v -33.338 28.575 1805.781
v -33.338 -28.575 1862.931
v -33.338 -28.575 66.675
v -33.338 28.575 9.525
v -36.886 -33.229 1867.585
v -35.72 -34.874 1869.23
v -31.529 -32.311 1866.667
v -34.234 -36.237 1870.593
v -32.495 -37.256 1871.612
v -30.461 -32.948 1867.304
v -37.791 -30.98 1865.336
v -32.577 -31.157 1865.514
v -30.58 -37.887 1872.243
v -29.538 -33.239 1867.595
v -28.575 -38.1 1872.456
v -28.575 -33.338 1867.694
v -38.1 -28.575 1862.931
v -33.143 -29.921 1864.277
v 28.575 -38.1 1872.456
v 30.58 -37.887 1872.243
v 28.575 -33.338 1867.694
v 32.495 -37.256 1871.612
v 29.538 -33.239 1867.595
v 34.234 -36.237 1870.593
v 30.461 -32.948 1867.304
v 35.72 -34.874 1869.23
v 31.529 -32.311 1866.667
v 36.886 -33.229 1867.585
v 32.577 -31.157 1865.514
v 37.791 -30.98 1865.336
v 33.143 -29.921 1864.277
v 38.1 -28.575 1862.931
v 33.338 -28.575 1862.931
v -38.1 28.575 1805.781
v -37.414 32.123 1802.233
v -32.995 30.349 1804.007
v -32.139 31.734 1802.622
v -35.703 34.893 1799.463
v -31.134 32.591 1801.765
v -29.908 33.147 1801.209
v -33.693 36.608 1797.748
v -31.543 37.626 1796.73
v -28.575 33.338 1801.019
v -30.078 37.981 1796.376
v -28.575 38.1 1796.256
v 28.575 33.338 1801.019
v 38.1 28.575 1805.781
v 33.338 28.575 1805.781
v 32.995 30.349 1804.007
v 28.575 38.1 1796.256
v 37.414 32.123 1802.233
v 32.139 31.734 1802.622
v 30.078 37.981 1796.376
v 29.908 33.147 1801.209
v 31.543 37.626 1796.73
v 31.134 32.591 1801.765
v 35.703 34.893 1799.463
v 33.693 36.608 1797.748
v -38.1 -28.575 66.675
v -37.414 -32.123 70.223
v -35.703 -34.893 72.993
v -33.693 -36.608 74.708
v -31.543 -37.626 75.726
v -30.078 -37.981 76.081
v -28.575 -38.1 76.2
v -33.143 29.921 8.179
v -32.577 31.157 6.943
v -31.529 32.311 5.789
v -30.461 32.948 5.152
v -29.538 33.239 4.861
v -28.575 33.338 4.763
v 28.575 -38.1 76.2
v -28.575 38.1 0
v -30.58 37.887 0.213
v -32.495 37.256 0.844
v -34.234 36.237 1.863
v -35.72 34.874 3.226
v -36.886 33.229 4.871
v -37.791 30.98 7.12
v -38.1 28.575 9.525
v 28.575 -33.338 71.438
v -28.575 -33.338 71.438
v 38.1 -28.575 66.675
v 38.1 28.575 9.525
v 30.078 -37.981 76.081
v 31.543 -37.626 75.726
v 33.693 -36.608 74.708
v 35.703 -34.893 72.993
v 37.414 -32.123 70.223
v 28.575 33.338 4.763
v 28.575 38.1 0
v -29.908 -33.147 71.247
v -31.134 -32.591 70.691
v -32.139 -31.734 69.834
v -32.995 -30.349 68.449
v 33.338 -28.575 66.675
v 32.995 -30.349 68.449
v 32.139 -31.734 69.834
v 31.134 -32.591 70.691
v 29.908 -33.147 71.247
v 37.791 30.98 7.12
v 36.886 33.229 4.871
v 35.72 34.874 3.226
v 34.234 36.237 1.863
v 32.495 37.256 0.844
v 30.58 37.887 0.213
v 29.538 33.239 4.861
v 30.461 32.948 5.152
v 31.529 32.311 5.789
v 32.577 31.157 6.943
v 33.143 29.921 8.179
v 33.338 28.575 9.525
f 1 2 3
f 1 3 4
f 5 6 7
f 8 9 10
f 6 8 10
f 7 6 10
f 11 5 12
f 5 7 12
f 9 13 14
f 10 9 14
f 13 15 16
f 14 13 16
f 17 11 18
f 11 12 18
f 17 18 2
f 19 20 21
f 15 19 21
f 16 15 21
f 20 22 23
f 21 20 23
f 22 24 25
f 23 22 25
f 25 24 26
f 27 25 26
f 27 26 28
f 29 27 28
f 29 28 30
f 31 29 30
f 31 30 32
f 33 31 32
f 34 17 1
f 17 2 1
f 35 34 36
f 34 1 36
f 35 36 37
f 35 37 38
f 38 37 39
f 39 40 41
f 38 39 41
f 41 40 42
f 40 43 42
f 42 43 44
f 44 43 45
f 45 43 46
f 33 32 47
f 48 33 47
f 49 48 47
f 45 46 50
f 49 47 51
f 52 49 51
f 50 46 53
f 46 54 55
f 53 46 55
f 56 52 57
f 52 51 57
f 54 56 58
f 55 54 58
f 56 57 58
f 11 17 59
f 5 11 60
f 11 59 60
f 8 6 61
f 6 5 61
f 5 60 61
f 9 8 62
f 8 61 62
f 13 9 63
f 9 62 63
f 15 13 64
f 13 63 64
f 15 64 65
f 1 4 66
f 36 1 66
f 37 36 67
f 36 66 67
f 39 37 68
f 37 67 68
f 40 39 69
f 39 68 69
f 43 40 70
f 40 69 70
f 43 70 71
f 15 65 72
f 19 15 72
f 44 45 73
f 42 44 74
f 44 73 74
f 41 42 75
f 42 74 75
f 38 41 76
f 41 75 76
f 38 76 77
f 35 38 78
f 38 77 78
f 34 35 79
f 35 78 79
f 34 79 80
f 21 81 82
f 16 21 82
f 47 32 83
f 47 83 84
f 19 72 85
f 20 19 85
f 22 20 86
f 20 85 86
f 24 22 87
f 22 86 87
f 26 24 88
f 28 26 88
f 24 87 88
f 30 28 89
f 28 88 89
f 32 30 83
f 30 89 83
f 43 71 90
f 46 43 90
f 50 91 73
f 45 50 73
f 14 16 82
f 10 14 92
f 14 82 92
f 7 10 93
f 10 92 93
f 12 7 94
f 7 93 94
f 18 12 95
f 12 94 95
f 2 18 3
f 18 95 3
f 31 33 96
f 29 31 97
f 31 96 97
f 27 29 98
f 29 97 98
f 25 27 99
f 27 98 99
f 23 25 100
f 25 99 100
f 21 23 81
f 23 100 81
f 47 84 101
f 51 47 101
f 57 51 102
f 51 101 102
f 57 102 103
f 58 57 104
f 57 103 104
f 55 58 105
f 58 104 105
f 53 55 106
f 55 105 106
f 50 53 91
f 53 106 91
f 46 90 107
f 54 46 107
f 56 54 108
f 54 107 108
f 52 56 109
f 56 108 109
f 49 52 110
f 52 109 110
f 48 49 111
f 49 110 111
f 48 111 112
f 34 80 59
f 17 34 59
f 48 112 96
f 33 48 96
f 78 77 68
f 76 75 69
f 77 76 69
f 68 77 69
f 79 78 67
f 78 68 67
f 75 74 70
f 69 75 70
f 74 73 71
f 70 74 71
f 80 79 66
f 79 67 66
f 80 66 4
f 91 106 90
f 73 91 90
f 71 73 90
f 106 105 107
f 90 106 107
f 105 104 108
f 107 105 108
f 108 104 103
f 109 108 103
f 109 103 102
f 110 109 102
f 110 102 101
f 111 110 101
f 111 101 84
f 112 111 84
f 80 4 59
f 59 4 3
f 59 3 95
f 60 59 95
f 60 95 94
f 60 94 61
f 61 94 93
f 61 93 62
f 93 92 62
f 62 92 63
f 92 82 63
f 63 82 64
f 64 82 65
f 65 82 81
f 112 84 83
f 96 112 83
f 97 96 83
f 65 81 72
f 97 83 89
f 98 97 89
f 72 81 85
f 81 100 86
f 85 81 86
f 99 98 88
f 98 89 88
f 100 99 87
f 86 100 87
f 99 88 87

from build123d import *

# Parameters (mm, degrees)
F1_DEPTH      = 1872.45625
F3_DEPTH      = 38.101
F3_DEPTH_BACK = 38.101


with BuildPart() as f1:
    # F0 (on Top) → F1 (new body)
    with BuildSketch(Plane.XY):
        with BuildLine():
            ThreePointArc((-38.1, -28.575), (-35.3101920908, -35.3101920908), (-28.575, -38.1))
            Line((-28.575, -38.1), (28.575, -38.1))
            ThreePointArc((28.575, -38.1), (35.3101920908, -35.3101920908), (38.1, -28.575))
            Line((38.1, -28.575), (38.1, 28.575))
            ThreePointArc((38.1, 28.575), (35.3101920908, 35.3101920908), (28.575, 38.1))
            Line((28.575, 38.1), (-28.575, 38.1))
            ThreePointArc((-28.575, 38.1), (-35.3101920908, 35.3101920908), (-38.1, 28.575))
            Line((-38.1, 28.575), (-38.1, -28.575))
        make_face()
        with BuildLine():
            Line((28.575, -33.3375), (-28.575, -33.3375))
            ThreePointArc((-28.575, -33.3375), (-31.9425960454, -31.9425960454), (-33.3375, -28.575))
            Line((-33.3375, -28.575), (-33.3375, 28.575))
            ThreePointArc((-33.3375, 28.575), (-31.9425960454, 31.9425960454), (-28.575, 33.3375))
            Line((-28.575, 33.3375), (28.575, 33.3375))
            ThreePointArc((28.575, 33.3375), (31.9425960454, 31.9425960454), (33.3375, 28.575))
            Line((33.3375, 28.575), (33.3375, -28.575))
            ThreePointArc((33.3375, -28.575), (31.9425960454, -31.9425960454), (28.575, -33.3375))
        make_face(mode=Mode.SUBTRACT)
    extrude(amount=F1_DEPTH)

    # F2 (on Right) → F3 (cut, two sides)
    with BuildSketch(Plane.YZ) as f3_sk:
        Polygon((-38.1, 76.2), (-38.1, 0), (38.1, 0), align=None)
        Polygon((38.1, 1872.45625), (-38.1, 1872.45625), (38.1, 1796.25625), align=None)
    extrude(amount=-F3_DEPTH, mode=Mode.SUBTRACT)
    extrude(f3_sk.sketch, amount=F3_DEPTH_BACK, mode=Mode.SUBTRACT)


solid = f1.part
